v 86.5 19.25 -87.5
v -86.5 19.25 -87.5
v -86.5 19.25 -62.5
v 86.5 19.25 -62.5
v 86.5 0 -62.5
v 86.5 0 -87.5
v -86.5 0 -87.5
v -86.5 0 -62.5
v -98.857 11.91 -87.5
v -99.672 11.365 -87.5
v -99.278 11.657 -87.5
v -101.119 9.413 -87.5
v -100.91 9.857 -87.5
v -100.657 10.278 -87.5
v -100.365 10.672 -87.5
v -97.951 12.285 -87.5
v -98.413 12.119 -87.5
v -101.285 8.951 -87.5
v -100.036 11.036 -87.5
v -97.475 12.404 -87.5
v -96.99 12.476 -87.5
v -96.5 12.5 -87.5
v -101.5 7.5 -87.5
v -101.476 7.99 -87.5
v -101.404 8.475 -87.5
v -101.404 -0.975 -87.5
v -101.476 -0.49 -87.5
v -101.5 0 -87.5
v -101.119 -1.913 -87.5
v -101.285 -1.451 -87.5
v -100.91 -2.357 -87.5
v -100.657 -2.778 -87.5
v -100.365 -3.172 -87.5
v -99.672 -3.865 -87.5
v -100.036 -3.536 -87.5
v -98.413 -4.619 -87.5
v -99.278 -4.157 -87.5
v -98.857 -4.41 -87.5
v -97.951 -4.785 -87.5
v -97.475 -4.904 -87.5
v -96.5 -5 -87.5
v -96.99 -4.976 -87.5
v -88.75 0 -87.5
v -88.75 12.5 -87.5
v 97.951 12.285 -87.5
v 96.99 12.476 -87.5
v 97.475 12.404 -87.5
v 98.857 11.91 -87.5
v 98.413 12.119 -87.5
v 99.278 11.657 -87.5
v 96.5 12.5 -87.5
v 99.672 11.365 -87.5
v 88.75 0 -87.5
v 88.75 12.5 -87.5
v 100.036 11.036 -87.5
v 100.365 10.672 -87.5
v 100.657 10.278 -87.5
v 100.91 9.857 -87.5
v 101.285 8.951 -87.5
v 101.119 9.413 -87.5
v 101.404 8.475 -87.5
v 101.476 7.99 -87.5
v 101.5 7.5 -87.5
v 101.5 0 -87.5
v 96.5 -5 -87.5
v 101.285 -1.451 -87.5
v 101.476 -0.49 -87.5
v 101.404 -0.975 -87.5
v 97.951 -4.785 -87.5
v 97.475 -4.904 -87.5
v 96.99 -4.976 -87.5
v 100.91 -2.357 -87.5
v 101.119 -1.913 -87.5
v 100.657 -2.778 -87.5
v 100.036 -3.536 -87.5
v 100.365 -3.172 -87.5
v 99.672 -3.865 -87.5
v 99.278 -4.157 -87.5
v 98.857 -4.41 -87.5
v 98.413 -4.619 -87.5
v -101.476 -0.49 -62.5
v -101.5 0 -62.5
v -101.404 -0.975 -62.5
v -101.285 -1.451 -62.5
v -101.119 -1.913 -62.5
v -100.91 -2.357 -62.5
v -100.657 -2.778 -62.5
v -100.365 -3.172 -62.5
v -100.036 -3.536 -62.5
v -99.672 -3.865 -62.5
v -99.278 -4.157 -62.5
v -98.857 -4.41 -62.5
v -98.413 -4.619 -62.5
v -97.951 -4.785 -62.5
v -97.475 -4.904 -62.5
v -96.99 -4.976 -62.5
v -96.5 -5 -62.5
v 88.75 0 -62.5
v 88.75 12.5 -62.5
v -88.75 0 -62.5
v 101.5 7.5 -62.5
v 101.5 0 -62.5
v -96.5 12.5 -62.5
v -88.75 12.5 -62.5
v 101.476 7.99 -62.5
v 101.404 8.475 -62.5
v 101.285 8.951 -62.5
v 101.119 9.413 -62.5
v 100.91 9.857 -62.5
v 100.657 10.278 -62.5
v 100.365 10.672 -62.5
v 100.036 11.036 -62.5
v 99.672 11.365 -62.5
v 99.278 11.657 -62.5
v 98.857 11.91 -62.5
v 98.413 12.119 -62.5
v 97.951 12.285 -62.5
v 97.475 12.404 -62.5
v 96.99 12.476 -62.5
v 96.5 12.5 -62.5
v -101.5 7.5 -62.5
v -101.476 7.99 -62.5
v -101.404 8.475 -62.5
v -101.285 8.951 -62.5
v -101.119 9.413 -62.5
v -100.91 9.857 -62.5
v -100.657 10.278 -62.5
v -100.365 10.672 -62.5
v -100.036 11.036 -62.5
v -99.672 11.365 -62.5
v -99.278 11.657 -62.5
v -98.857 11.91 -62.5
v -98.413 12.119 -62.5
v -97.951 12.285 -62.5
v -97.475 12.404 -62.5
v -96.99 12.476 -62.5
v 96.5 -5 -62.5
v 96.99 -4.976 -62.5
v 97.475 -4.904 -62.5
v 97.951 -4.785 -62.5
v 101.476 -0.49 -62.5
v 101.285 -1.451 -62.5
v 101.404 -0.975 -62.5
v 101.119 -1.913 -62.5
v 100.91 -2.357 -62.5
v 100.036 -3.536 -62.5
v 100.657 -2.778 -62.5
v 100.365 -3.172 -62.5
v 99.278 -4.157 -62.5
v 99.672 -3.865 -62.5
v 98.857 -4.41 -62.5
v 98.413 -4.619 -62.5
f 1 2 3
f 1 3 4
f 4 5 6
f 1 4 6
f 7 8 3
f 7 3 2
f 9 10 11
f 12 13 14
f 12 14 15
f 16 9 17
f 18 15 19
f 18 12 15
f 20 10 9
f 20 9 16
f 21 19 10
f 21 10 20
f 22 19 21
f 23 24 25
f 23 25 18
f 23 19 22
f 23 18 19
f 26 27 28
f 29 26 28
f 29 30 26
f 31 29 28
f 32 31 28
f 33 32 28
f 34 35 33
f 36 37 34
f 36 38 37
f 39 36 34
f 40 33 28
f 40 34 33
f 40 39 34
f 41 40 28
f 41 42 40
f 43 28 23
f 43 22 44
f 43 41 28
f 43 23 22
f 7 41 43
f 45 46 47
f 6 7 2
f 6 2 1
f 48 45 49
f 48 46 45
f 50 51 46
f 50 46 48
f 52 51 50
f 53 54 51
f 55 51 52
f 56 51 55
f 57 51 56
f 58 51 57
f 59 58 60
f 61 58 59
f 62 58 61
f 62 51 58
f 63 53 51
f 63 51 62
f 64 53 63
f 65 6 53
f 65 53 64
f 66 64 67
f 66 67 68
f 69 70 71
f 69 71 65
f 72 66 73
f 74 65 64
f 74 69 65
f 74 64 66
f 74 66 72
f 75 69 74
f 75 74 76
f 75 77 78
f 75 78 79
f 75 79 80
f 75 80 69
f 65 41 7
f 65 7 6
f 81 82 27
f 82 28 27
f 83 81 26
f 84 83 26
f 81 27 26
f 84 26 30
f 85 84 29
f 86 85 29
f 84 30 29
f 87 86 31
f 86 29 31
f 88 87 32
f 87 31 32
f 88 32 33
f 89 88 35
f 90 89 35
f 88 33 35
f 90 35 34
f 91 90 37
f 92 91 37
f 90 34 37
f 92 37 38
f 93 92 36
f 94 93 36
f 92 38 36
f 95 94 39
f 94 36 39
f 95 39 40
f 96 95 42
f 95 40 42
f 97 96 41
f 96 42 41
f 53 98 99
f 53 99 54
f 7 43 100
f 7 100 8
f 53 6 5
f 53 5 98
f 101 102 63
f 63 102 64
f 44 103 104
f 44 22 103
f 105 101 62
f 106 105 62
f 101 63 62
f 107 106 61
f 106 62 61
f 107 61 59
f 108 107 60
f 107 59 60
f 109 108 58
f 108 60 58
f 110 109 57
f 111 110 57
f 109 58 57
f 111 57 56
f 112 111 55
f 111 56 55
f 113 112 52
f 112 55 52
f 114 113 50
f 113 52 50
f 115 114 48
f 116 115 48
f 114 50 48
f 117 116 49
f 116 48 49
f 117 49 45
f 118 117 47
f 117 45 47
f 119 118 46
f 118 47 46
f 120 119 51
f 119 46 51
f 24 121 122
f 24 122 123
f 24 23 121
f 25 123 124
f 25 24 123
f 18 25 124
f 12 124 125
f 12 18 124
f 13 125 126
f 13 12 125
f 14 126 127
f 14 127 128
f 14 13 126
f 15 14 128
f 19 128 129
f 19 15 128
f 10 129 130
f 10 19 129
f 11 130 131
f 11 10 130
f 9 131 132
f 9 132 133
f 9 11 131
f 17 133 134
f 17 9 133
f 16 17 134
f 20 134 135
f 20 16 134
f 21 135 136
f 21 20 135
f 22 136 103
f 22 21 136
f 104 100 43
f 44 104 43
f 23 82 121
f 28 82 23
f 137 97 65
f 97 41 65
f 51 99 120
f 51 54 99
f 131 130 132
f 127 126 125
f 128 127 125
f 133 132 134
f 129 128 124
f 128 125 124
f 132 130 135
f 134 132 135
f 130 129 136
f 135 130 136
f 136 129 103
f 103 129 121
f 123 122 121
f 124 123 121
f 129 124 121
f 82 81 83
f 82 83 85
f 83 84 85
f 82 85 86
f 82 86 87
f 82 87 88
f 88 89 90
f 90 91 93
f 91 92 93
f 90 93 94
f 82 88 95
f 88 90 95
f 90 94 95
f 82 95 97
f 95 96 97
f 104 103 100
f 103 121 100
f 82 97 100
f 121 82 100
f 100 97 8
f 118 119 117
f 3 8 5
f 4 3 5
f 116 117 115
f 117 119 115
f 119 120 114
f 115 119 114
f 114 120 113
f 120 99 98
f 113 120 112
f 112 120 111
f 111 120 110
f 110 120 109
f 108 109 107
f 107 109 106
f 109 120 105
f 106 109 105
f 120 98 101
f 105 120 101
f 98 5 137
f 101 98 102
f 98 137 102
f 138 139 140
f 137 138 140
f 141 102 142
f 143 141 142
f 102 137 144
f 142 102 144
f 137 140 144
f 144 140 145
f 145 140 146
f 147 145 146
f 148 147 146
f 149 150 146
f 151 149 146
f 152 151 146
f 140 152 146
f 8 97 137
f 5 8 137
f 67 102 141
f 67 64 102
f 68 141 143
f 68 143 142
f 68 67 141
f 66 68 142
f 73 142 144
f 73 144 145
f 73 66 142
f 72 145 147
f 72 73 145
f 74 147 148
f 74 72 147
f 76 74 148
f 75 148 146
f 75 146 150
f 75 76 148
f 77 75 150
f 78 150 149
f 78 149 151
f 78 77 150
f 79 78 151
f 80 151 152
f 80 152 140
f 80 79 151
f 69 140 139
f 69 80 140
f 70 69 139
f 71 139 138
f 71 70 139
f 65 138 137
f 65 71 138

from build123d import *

# Parameters (mm, degrees)
BOSS_EXTRUDE1_DEPTH      = 19.25
BOSS_EXTRUDE1_DEPTH_BACK = 5
SKETCH1_W                = 173
SKETCH1_H                = 25
SKETCH2_W                = 15
SKETCH2_H                = 25
BOSS_EXTRUDE2_DEPTH      = 5
SKETCH3_W                = 12.75
SKETCH3_H                = 25
BOSS_EXTRUDE3_DEPTH      = 12.5
FILLET1_R                = 5


with BuildPart() as part:
    # Sketch1 → Boss-Extrude1 (new, two sides: drawn at the far end of the back side and taken through both)
    with BuildSketch(Plane(origin=(0, 0, 0), x_dir=(1, 0, 0), z_dir=(0, 1, 0)).offset(-BOSS_EXTRUDE1_DEPTH_BACK)):
        with Locations((0, 75)):
            Rectangle(SKETCH1_W, SKETCH1_H)
    extrude(amount=BOSS_EXTRUDE1_DEPTH + BOSS_EXTRUDE1_DEPTH_BACK)

    # Sketch2 → Boss-Extrude2 (add)
    with BuildSketch(Plane(origin=(0, -5, 0), x_dir=(1, 0, 0), z_dir=(0, 1, 0))):
        with Locations((-94, 75)):
            Rectangle(SKETCH2_W, SKETCH2_H)
        with Locations((94, 75)):
            Rectangle(SKETCH2_W, SKETCH2_H)
    extrude(amount=BOSS_EXTRUDE2_DEPTH)

    # Sketch3 → Boss-Extrude3 (add)
    with BuildSketch(Plane(origin=(0, 0, 0), x_dir=(1, 0, 0), z_dir=(0, 1, 0))):
        with Locations((-95.125, 75)):
            Rectangle(SKETCH3_W, SKETCH3_H)
        with Locations((95.125, 75)):
            Rectangle(SKETCH3_W, SKETCH3_H)
    extrude(amount=BOSS_EXTRUDE3_DEPTH)

    # Fillet1
    fillet1_edges = [part.edges().sort_by_distance(p)[0] for p in [
        (-101.5, -5, -75),
        (101.5, -5, -75),
        (-101.5, 12.5, -75),
        (101.5, 12.5, -75),
    ]]
    fillet(fillet1_edges, radius=FILLET1_R)


solid = part.part
